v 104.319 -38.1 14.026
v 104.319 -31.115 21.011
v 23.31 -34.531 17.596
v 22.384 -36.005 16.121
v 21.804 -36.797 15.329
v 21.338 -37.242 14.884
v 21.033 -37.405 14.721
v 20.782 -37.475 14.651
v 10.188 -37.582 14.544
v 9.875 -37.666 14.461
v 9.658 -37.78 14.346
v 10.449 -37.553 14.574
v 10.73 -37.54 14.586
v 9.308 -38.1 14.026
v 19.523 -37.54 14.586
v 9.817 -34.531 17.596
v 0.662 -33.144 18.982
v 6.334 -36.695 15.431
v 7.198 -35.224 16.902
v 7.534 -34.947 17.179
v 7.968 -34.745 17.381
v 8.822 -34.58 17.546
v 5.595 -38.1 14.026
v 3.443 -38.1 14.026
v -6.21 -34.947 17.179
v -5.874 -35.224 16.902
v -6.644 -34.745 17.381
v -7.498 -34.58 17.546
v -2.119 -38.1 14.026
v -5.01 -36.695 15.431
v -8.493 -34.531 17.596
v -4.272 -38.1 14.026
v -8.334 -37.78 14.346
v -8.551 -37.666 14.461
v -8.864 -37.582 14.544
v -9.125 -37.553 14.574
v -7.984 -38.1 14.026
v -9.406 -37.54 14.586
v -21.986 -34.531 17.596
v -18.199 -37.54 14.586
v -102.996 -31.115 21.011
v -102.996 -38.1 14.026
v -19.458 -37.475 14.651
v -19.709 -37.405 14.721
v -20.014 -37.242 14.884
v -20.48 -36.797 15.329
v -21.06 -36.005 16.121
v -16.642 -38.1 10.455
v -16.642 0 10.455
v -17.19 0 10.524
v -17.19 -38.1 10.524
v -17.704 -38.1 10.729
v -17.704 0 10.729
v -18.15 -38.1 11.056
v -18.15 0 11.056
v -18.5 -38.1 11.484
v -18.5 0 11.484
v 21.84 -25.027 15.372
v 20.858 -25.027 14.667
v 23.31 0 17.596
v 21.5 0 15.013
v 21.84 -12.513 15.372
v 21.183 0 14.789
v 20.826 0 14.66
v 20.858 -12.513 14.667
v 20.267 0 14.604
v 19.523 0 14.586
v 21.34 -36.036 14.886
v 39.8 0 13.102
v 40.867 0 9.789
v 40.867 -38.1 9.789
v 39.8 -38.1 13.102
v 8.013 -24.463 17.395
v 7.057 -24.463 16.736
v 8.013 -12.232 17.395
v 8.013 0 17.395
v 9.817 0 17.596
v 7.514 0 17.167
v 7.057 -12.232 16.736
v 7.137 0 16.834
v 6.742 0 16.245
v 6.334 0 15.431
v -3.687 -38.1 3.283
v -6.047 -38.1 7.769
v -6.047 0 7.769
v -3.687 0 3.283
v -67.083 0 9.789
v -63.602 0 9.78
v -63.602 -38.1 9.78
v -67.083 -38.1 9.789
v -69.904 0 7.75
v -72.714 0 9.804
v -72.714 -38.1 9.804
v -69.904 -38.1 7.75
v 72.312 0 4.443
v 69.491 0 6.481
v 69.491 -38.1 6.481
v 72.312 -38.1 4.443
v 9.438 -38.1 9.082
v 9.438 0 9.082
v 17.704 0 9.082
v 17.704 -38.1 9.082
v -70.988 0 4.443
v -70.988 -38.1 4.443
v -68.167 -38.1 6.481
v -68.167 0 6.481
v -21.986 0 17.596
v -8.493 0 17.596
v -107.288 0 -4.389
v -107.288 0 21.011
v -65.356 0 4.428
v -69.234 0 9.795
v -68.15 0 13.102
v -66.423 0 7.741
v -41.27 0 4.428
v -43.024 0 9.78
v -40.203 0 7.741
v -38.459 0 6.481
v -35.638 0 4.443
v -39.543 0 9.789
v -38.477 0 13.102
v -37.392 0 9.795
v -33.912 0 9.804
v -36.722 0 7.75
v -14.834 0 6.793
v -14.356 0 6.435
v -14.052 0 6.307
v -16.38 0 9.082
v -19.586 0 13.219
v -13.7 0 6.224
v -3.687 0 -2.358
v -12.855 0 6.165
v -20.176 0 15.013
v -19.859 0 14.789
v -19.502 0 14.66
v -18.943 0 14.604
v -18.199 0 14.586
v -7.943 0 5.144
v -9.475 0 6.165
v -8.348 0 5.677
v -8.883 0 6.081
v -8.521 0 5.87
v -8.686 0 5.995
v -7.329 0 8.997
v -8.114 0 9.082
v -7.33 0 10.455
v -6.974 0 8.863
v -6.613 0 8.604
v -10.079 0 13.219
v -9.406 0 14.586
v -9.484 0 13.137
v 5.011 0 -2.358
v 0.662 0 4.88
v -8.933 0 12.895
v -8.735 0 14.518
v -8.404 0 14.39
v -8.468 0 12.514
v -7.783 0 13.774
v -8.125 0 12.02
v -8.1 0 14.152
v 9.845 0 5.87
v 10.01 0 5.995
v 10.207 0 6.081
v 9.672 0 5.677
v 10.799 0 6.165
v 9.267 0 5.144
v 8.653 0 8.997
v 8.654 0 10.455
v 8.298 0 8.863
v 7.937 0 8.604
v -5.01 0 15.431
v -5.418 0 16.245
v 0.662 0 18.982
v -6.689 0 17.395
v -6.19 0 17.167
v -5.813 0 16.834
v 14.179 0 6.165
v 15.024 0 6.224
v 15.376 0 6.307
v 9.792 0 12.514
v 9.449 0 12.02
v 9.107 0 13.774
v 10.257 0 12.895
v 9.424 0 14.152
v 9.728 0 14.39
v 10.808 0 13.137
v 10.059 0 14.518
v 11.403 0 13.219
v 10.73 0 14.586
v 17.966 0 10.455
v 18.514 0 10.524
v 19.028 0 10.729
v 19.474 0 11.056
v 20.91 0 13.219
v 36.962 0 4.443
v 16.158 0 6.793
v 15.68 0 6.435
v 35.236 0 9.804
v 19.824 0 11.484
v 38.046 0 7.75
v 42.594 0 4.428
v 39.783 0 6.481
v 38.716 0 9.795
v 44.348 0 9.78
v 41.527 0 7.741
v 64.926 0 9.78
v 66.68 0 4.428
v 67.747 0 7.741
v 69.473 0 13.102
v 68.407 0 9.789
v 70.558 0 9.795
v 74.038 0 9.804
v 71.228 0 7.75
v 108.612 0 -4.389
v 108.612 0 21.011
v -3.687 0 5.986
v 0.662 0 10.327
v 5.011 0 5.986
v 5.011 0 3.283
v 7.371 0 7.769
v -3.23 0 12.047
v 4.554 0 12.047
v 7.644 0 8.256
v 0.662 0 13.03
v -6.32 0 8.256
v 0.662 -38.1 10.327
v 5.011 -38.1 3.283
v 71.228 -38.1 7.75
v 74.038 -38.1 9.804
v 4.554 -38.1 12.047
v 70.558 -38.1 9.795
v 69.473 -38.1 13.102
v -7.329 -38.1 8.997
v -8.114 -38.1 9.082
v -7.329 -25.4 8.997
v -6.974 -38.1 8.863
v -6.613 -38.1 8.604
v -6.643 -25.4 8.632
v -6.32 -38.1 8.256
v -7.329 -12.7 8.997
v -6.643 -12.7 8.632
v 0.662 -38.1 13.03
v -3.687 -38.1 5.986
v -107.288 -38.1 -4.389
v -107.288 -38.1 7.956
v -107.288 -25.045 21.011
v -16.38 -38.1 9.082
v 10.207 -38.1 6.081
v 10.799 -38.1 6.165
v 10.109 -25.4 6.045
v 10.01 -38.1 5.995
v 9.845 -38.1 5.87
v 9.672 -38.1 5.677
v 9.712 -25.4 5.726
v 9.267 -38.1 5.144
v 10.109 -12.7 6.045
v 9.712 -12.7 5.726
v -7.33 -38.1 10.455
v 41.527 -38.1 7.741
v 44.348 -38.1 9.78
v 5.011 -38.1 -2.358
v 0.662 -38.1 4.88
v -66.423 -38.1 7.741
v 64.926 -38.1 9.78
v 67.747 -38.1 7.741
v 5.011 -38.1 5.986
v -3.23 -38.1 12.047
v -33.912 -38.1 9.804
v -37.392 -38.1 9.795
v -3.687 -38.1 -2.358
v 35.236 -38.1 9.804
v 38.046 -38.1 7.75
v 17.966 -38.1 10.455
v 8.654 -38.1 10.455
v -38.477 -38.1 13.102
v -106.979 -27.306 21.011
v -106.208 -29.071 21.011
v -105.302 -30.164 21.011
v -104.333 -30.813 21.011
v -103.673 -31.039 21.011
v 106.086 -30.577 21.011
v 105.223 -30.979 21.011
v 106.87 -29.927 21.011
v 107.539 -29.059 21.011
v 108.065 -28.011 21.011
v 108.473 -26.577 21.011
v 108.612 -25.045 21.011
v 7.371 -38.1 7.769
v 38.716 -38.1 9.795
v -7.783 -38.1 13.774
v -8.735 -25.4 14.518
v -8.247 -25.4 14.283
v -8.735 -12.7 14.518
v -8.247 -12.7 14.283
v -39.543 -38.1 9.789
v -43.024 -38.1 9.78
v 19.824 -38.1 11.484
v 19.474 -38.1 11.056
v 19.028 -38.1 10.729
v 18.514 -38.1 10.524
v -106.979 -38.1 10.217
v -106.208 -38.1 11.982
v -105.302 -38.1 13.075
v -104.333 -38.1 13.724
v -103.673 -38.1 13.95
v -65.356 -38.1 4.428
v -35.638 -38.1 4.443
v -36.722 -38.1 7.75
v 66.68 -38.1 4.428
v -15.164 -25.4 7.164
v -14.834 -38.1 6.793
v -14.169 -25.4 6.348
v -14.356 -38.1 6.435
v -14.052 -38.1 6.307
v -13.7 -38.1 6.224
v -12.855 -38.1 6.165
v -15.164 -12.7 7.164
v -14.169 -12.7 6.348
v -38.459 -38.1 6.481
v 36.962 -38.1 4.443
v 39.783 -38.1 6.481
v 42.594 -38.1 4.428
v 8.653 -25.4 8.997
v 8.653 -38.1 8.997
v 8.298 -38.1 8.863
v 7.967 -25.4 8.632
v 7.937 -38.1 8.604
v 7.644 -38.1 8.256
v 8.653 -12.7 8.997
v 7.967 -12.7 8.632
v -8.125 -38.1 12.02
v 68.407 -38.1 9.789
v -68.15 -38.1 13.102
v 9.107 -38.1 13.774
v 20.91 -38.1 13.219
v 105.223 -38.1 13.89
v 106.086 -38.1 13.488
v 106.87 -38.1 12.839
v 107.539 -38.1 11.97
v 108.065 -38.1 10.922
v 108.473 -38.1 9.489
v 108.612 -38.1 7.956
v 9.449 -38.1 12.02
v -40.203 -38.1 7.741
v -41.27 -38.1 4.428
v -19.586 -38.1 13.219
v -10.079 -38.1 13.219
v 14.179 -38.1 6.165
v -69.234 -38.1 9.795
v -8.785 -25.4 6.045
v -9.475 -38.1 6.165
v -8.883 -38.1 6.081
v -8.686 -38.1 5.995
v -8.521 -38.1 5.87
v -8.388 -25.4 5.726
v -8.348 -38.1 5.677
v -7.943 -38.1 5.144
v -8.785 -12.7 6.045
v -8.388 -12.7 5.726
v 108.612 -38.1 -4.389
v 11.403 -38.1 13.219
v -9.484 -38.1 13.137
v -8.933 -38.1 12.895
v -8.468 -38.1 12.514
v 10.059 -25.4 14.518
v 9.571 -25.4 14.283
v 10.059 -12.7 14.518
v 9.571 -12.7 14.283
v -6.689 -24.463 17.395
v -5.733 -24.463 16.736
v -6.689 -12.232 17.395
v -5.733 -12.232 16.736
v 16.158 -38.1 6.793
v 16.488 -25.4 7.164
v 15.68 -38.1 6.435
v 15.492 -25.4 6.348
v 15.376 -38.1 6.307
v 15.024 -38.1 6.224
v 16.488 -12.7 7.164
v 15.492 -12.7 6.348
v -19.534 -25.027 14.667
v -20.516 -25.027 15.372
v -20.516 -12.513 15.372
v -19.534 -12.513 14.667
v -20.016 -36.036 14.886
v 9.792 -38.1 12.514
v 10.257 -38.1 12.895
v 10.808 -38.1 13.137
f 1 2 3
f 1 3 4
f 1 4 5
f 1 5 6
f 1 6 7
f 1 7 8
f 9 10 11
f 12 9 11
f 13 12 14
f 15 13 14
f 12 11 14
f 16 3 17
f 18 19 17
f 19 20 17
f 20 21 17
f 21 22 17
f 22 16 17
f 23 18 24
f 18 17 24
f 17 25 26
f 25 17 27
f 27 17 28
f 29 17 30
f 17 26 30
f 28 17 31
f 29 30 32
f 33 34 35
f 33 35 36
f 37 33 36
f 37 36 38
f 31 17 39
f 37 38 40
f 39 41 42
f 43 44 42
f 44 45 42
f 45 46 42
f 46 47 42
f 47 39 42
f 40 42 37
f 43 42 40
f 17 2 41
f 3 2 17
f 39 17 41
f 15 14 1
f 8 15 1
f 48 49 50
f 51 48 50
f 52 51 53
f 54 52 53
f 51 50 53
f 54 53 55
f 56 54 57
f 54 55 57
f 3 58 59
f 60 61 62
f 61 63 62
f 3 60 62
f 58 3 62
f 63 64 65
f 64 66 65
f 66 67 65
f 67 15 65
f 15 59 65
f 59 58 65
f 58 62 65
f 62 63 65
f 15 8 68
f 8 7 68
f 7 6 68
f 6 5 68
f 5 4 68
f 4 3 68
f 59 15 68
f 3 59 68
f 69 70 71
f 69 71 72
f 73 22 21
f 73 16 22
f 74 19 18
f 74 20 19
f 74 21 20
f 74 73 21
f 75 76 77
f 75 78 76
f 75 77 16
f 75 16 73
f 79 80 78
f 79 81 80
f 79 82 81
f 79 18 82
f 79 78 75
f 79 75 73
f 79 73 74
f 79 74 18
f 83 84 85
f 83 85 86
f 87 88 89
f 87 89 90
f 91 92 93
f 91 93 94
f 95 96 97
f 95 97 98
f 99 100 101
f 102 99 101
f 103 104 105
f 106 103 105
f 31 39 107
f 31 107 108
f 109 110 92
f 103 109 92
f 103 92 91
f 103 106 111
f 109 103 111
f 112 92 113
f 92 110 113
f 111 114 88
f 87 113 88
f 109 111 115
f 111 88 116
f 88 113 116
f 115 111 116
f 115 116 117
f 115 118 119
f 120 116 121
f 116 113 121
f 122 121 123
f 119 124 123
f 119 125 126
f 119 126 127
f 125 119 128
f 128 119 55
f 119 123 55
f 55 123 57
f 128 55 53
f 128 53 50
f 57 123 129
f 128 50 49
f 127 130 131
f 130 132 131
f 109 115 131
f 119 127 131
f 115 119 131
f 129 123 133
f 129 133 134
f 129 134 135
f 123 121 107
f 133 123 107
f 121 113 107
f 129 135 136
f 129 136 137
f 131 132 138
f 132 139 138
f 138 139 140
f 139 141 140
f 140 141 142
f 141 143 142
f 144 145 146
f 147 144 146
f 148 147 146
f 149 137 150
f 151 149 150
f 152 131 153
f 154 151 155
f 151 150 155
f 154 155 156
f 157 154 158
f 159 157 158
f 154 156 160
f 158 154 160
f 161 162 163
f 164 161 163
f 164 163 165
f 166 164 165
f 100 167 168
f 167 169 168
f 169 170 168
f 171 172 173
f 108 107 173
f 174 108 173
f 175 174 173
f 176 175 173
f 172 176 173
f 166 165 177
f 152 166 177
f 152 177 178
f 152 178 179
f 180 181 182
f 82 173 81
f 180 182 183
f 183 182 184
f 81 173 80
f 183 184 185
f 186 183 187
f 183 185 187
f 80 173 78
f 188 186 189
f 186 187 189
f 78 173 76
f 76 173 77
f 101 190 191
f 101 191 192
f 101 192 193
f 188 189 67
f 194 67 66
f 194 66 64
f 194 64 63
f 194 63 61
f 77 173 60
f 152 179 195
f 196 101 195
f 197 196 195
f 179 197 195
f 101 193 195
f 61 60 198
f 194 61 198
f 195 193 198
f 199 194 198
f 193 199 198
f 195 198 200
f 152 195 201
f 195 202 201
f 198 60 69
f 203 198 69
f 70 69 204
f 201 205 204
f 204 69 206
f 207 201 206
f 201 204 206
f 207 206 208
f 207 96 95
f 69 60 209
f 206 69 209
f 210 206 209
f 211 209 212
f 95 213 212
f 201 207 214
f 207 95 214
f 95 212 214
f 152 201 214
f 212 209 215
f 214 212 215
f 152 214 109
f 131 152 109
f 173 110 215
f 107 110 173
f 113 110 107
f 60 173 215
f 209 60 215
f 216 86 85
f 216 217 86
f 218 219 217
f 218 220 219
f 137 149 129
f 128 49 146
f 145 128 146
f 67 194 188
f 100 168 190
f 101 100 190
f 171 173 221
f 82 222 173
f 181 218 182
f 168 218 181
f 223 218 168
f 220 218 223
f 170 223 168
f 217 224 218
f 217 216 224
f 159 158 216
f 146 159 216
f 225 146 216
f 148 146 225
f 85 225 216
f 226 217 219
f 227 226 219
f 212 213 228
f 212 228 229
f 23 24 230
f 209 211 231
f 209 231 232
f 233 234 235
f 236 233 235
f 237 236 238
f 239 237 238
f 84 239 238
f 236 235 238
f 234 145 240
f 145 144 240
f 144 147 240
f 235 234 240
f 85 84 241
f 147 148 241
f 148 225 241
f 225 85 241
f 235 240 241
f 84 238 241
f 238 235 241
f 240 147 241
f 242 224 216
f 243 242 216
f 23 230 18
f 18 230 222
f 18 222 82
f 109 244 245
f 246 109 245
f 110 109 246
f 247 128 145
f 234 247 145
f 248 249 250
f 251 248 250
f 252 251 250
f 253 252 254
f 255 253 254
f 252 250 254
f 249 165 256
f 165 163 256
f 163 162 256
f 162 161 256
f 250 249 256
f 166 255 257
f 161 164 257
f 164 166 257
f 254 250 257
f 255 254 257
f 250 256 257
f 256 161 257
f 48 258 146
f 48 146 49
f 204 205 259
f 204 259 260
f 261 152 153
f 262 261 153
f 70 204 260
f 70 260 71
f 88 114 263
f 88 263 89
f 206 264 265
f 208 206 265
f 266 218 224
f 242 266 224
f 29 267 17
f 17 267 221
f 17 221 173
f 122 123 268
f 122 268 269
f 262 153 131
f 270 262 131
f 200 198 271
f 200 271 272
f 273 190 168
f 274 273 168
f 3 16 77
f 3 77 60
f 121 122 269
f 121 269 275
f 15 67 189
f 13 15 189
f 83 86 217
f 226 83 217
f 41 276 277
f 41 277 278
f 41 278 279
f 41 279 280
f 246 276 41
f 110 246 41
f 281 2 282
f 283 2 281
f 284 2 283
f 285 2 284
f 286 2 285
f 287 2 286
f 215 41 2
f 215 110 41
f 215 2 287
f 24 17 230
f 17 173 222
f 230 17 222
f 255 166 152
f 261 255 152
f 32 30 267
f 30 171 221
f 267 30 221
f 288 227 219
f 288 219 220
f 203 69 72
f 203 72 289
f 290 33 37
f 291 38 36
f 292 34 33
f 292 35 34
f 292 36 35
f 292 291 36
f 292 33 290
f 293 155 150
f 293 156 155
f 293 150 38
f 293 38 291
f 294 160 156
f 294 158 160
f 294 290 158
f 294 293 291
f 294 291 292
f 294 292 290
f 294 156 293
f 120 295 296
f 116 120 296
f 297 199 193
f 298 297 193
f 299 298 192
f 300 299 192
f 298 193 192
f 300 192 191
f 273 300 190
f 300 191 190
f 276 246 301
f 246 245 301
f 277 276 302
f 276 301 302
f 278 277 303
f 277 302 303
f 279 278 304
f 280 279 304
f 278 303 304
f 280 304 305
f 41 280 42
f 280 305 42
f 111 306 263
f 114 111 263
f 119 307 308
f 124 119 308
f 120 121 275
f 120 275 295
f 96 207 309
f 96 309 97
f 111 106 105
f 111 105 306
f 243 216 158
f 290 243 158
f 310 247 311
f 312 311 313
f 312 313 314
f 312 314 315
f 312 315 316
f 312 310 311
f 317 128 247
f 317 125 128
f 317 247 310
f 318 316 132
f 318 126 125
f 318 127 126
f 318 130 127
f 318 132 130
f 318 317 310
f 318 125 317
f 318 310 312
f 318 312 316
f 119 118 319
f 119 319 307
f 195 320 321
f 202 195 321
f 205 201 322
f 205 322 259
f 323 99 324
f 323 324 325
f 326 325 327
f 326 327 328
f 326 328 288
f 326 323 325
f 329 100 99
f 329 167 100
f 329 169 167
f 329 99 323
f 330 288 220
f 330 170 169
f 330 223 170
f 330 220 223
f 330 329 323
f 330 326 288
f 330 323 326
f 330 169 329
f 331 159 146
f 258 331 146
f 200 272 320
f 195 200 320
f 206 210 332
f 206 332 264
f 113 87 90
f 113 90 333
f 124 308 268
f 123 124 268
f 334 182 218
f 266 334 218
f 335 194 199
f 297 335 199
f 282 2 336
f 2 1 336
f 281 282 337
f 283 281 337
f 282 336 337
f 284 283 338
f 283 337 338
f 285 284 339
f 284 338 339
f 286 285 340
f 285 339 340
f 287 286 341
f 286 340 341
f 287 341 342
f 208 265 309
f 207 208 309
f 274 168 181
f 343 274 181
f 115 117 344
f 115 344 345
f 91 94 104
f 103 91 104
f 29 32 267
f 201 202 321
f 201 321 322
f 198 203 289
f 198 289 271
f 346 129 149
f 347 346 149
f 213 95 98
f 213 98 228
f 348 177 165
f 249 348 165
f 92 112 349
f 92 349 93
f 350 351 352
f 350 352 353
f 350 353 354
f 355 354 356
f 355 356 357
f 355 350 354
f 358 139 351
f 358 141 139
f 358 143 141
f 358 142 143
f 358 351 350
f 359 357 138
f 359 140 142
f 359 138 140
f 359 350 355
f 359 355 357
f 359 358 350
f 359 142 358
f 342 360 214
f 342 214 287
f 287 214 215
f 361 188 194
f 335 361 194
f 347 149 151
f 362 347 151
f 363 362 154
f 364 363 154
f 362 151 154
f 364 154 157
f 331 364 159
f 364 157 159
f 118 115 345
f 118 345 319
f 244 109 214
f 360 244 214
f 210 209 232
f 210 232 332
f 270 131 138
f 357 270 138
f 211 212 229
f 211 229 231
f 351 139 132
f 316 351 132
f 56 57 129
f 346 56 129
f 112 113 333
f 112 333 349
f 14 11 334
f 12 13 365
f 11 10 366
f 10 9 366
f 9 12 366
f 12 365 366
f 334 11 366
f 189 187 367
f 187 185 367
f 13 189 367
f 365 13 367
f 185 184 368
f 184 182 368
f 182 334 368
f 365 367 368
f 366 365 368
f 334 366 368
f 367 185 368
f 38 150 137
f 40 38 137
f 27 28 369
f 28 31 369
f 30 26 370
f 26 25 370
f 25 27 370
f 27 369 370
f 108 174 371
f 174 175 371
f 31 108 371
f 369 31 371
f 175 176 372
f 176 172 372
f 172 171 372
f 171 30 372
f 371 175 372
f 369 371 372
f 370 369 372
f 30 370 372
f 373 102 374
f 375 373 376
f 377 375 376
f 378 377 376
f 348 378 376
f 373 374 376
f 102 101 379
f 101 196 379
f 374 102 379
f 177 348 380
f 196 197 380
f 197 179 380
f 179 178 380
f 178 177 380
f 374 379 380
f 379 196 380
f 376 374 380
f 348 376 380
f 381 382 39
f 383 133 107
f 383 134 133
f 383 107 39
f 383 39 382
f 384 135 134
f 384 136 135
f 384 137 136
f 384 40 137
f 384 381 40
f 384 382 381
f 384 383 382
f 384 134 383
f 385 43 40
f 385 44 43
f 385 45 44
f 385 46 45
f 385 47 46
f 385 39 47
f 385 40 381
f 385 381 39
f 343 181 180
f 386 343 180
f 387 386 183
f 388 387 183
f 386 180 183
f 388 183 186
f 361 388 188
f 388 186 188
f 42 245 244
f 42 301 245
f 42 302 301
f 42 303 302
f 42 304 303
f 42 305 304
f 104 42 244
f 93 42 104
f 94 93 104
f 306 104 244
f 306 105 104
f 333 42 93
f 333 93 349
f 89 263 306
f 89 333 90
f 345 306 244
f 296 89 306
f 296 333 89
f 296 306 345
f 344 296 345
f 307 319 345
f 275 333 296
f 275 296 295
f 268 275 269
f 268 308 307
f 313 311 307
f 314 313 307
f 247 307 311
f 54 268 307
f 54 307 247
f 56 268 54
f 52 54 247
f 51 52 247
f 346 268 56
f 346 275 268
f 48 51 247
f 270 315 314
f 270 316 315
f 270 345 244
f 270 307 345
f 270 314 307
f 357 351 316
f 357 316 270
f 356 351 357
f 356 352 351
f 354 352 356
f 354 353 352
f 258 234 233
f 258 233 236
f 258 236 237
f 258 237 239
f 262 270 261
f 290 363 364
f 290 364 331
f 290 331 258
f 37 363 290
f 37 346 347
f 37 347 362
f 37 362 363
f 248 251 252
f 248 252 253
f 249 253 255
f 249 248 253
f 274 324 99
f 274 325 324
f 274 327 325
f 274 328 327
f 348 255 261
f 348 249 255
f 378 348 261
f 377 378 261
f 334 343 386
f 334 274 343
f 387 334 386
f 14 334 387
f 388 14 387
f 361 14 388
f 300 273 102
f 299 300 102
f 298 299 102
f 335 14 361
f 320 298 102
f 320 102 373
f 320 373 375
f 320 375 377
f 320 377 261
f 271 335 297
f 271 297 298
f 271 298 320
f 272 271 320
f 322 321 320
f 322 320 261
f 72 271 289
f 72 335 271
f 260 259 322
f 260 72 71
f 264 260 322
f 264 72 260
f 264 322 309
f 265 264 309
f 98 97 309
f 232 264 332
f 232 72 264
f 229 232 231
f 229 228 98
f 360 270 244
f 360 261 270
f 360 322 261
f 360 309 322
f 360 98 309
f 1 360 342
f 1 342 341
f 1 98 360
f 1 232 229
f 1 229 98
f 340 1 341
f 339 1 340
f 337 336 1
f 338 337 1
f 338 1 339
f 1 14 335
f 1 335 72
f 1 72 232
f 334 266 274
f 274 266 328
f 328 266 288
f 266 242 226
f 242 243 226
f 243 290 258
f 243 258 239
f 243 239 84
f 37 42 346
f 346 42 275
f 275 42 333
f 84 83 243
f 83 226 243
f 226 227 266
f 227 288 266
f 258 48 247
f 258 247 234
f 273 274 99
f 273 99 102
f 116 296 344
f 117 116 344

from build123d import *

# Parameters (mm, degrees)
F0_W        = 215.9
F0_H        = 25.4
F1_DEPTH    = 38.1
F3_DEPTH    = 38.1
F4_T1_DEPTH = 251.8264113419
F5_R        = 4.2924717139


# Not quite as in the source:
# - a fillet or chamfer that OpenCascade refuses, or shapes differently, is made with other operations: its cross-section is extruded or revolved along the edge and cut away or added


with BuildPart() as f1:
    # F0 (on Front) → F1 (new body)
    with BuildSketch(Plane.XZ):
        with Locations((0.6619617343, 8.3113107191)):
            Rectangle(F0_W, F0_H)
        with BuildLine():
            add(Edge.make_bspline(
                [(-16.3802020252, 9.0824095532), (-14.8727670312, 6.4565530047), (-14.5080648363, 6.1891046353), (-12.8547474742, 6.1647910625)],
                knots=[0, 0, 0, 0, 4.576169517, 4.576169517, 4.576169517, 4.576169517], degree=3))
            Line((-16.3802020252, 9.0824095532), (-8.1136170775, 9.0824095532))
            add(Edge.make_bspline(
                [(-8.1136170775, 9.0824095532), (-7.2759063914, 9.0653235093), (-6.6012172028, 8.9528746903), (-6.0469708405, 7.769481279)],
                knots=[0, 0, 0, 0, 2.4484295624, 2.4484295624, 2.4484295624, 2.4484295624], degree=3))
            Line((-6.0469708405, 7.769481279), (-3.6874657962, 3.2825956335))
            Line((-3.6874657962, 3.2825956335), (0.6619617343, 10.3273617318))
            Line((0.6619617343, 10.3273617318), (5.0113892648, 3.2825956335))
            Line((5.0113892648, 3.2825956335), (7.3708943091, 7.769481279))
            add(Edge.make_bspline(
                [(9.4375405461, 9.0824095532), (8.59982986, 9.0653235093), (7.9251406714, 8.9528746903), (7.3708943091, 7.769481279)],
                knots=[0, 0, 0, 0, 2.4484295624, 2.4484295624, 2.4484295624, 2.4484295624], degree=3))
            Line((9.4375405461, 9.0824095532), (17.7041254938, 9.0824095532))
            add(Edge.make_bspline(
                [(17.7041254938, 9.0824095532), (16.1966904998, 6.4565530047), (15.8319883049, 6.1891046353), (14.1786709428, 6.1647910625)],
                knots=[0, 0, 0, 0, 4.576169517, 4.576169517, 4.576169517, 4.576169517], degree=3))
            Line((14.1786709428, 6.1647910625), (10.7990959659, 6.1647910625))
            add(Edge.make_bspline(
                [(10.7990959659, 6.1647910625), (9.8487436771, 6.1233234592), (9.8487436771, 5.8779818937), (9.2673460022, 5.1436247304)],
                knots=[0, 0, 0, 0, 1.840934173, 1.840934173, 1.840934173, 1.840934173], degree=3))
            Line((9.2673460022, 5.1436247304), (5.0113892648, -2.3575623054))
            Line((5.0113892648, -2.3575623054), (0.6619617343, 4.8800110817))
            Line((0.6619617343, 4.8800110817), (-3.6874657962, -2.3575623054))
            Line((-3.6874657962, -2.3575623054), (-7.9434225336, 5.1436247304))
            add(Edge.make_bspline(
                [(-9.4751724973, 6.1647910625), (-8.5248202085, 6.1233234592), (-8.5248202085, 5.8779818937), (-7.9434225336, 5.1436247304)],
                knots=[0, 0, 0, 0, 1.840934173, 1.840934173, 1.840934173, 1.840934173], degree=3))
            Line((-9.4751724973, 6.1647910625), (-12.8547474742, 6.1647910625))
        make_face(mode=Mode.SUBTRACT)
        with BuildLine():
            Line((-18.4998314541, 11.4835865716), (-19.5860914445, 13.219167863))
            Line((-19.5860914445, 13.219167863), (-10.0794029066, 13.219167863))
            ThreePointArc((-10.0794029066, 13.219167863), (-8.9329270461, 12.8954335527), (-8.1251045992, 12.0198573444))
            Line((-8.1251045992, 12.0198573444), (-7.3300511576, 10.4545447975))
            Line((-7.3300511576, 10.4545447975), (-16.641804624, 10.4545447975))
            ThreePointArc((-16.641804624, 10.4545447975), (-17.7037828104, 10.7289859143), (-18.4998314541, 11.4835865716))
        make_face(mode=Mode.SUBTRACT)
        with BuildLine():
            add(Edge.make_bspline(
                [(-21.9861995429, 17.5955053419), (-19.9910327792, 14.315311797), (-19.9910327792, 14.6534768865), (-18.1987602264, 14.5858433098)],
                knots=[0, 0, 0, 0, 4.83764014, 4.83764014, 4.83764014, 4.83764014], degree=3))
            Line((-21.9861995429, 17.5955053419), (-8.4934448823, 17.5955053419))
            add(Edge.make_bspline(
                [(-8.4934448823, 17.5955053419), (-6.0586617328, 17.5616890192), (-5.8219470084, 17.1220749617), (-5.0103529356, 15.4312541708)],
                knots=[0, 0, 0, 0, 4.1007209903, 4.1007209903, 4.1007209903, 4.1007209903], degree=3))
            Line((-5.0103529356, 15.4312541708), (-3.2304712382, 12.0465927742))
            Line((-3.2304712382, 12.0465927742), (0.6619617343, 18.9819801599))
            Line((0.6619617343, 18.9819801599), (4.5543947068, 12.0465927742))
            Line((4.5543947068, 12.0465927742), (6.3342764042, 15.4312541708))
            add(Edge.make_bspline(
                [(9.8173683509, 17.5955053419), (7.3825852014, 17.5616890192), (7.145870477, 17.1220749617), (6.3342764042, 15.4312541708)],
                knots=[0, 0, 0, 0, 4.1007209903, 4.1007209903, 4.1007209903, 4.1007209903], degree=3))
            Line((9.8173683509, 17.5955053419), (23.3101230115, 17.5955053419))
            add(Edge.make_bspline(
                [(23.3101230115, 17.5955053419), (21.3149562478, 14.315311797), (21.3149562478, 14.6534768865), (19.522683695, 14.5858433098)],
                knots=[0, 0, 0, 0, 4.83764014, 4.83764014, 4.83764014, 4.83764014], degree=3))
            Line((19.522683695, 14.5858433098), (10.7304118574, 14.5858433098))
            add(Edge.make_bspline(
                [(10.7304118574, 14.5858433098), (9.9142082036, 14.5666254684), (9.6125975251, 14.456034638), (9.1072237119, 13.7742487714)],
                knots=[0, 0, 0, 0, 1.814779725, 1.814779725, 1.814779725, 1.814779725], degree=3))
            Line((9.1072237119, 13.7742487714), (5.0113892648, 5.9855217114))
            Line((5.0113892648, 5.9855217114), (0.6619617343, 13.0302878097))
            Line((0.6619617343, 13.0302878097), (-3.6874657962, 5.9855217114))
            Line((-3.6874657962, 5.9855217114), (-7.7833002433, 13.7742487714))
            add(Edge.make_bspline(
                [(-9.4064883888, 14.5858433098), (-8.590284735, 14.5666254684), (-8.2886740565, 14.456034638), (-7.7833002433, 13.7742487714)],
                knots=[0, 0, 0, 0, 1.814779725, 1.814779725, 1.814779725, 1.814779725], degree=3))
            Line((-9.4064883888, 14.5858433098), (-18.1987602264, 14.5858433098))
        make_face(mode=Mode.SUBTRACT)
        with BuildLine():
            Line((11.4033263752, 13.219167863), (20.910014913, 13.219167863))
            Line((20.910014913, 13.219167863), (19.8237549226, 11.4835865716))
            ThreePointArc((19.8237549226, 11.4835865716), (19.027706279, 10.7289859143), (17.9657280925, 10.4545447975))
            Line((17.9657280925, 10.4545447975), (8.6539746262, 10.4545447975))
            Line((8.6539746262, 10.4545447975), (9.4490280678, 12.0198573444))
            ThreePointArc((9.4490280678, 12.0198573444), (10.2568505147, 12.8954335527), (11.4033263752, 13.219167863))
        make_face(mode=Mode.SUBTRACT)
    extrude(amount=F1_DEPTH)

    # F2 (on Front) → F3 (cut, through all)
    with BuildSketch(Plane.XZ):
        Polygon((-40.2027384589, 7.7412761245), (-41.2695823308, 4.4282208097), (-38.459122454, 6.4814637683), (-35.6378924948, 4.4430445564), (-36.7221627261, 7.7504377039), (-33.9117028493, 9.8036806625), (-37.3922785821, 9.7945190831), (-38.4765488134, 13.1019122305), (-39.5433926854, 9.7888569157), (-43.0239684182, 9.7796953364), align=None)
        Polygon((39.800472282, 13.1019122305), (38.7162020507, 9.7945190831), (35.2356263179, 9.8036806625), (38.0460861947, 7.7504377039), (36.9618159633, 4.4430445564), (39.7830459226, 6.4814637683), (42.5935057994, 4.4282208097), (41.5266619275, 7.7412761245), (44.3478918867, 9.7796953364), (40.867316154, 9.7888569157), align=None)
        Polygon((-63.6021081133, 9.7796953364), (-67.082683846, 9.7888569157), (-68.149527718, 13.1019122305), (-69.2337979493, 9.7945190831), (-72.7143736821, 9.8036806625), (-69.9039138053, 7.7504377039), (-70.9881840367, 4.4430445564), (-68.1669540774, 6.4814637683), (-65.3564942006, 4.4282208097), (-66.4233380725, 7.7412761245), align=None)
        Polygon((70.5577214179, 9.7945190831), (69.4734511866, 13.1019122305), (68.4066073146, 9.7888569157), (64.9260315818, 9.7796953364), (67.7472615411, 7.7412761245), (66.6804176692, 4.4282208097), (69.490877546, 6.4814637683), (72.3121075052, 4.4430445564), (71.2278372739, 7.7504377039), (74.0382971507, 9.8036806625), align=None)
    extrude(amount=F3_DEPTH, mode=Mode.SUBTRACT)

    # F4: chamfer of 6.985 on 1 edges, made by hand

    # F4_s2 → F4_t1 (cut)
    with BuildSketch(Plane.YZ.offset(-125.2512439366)):
        Polygon((-31.115, 21.0113107191), (-38.1, 14.0263107191), (-38.1, 21.0113107191), align=None)
    extrude(amount=F4_T1_DEPTH, mode=Mode.SUBTRACT)

    # F5
    f5_edges = [f1.edges().sort_by_distance(p)[0] for p in [
        (108.611962, -34.6075, 17.518811),
        (-107.288038, -34.6075, 17.518811),
    ]]
    fillet(f5_edges, radius=F5_R)


solid = f1.part
